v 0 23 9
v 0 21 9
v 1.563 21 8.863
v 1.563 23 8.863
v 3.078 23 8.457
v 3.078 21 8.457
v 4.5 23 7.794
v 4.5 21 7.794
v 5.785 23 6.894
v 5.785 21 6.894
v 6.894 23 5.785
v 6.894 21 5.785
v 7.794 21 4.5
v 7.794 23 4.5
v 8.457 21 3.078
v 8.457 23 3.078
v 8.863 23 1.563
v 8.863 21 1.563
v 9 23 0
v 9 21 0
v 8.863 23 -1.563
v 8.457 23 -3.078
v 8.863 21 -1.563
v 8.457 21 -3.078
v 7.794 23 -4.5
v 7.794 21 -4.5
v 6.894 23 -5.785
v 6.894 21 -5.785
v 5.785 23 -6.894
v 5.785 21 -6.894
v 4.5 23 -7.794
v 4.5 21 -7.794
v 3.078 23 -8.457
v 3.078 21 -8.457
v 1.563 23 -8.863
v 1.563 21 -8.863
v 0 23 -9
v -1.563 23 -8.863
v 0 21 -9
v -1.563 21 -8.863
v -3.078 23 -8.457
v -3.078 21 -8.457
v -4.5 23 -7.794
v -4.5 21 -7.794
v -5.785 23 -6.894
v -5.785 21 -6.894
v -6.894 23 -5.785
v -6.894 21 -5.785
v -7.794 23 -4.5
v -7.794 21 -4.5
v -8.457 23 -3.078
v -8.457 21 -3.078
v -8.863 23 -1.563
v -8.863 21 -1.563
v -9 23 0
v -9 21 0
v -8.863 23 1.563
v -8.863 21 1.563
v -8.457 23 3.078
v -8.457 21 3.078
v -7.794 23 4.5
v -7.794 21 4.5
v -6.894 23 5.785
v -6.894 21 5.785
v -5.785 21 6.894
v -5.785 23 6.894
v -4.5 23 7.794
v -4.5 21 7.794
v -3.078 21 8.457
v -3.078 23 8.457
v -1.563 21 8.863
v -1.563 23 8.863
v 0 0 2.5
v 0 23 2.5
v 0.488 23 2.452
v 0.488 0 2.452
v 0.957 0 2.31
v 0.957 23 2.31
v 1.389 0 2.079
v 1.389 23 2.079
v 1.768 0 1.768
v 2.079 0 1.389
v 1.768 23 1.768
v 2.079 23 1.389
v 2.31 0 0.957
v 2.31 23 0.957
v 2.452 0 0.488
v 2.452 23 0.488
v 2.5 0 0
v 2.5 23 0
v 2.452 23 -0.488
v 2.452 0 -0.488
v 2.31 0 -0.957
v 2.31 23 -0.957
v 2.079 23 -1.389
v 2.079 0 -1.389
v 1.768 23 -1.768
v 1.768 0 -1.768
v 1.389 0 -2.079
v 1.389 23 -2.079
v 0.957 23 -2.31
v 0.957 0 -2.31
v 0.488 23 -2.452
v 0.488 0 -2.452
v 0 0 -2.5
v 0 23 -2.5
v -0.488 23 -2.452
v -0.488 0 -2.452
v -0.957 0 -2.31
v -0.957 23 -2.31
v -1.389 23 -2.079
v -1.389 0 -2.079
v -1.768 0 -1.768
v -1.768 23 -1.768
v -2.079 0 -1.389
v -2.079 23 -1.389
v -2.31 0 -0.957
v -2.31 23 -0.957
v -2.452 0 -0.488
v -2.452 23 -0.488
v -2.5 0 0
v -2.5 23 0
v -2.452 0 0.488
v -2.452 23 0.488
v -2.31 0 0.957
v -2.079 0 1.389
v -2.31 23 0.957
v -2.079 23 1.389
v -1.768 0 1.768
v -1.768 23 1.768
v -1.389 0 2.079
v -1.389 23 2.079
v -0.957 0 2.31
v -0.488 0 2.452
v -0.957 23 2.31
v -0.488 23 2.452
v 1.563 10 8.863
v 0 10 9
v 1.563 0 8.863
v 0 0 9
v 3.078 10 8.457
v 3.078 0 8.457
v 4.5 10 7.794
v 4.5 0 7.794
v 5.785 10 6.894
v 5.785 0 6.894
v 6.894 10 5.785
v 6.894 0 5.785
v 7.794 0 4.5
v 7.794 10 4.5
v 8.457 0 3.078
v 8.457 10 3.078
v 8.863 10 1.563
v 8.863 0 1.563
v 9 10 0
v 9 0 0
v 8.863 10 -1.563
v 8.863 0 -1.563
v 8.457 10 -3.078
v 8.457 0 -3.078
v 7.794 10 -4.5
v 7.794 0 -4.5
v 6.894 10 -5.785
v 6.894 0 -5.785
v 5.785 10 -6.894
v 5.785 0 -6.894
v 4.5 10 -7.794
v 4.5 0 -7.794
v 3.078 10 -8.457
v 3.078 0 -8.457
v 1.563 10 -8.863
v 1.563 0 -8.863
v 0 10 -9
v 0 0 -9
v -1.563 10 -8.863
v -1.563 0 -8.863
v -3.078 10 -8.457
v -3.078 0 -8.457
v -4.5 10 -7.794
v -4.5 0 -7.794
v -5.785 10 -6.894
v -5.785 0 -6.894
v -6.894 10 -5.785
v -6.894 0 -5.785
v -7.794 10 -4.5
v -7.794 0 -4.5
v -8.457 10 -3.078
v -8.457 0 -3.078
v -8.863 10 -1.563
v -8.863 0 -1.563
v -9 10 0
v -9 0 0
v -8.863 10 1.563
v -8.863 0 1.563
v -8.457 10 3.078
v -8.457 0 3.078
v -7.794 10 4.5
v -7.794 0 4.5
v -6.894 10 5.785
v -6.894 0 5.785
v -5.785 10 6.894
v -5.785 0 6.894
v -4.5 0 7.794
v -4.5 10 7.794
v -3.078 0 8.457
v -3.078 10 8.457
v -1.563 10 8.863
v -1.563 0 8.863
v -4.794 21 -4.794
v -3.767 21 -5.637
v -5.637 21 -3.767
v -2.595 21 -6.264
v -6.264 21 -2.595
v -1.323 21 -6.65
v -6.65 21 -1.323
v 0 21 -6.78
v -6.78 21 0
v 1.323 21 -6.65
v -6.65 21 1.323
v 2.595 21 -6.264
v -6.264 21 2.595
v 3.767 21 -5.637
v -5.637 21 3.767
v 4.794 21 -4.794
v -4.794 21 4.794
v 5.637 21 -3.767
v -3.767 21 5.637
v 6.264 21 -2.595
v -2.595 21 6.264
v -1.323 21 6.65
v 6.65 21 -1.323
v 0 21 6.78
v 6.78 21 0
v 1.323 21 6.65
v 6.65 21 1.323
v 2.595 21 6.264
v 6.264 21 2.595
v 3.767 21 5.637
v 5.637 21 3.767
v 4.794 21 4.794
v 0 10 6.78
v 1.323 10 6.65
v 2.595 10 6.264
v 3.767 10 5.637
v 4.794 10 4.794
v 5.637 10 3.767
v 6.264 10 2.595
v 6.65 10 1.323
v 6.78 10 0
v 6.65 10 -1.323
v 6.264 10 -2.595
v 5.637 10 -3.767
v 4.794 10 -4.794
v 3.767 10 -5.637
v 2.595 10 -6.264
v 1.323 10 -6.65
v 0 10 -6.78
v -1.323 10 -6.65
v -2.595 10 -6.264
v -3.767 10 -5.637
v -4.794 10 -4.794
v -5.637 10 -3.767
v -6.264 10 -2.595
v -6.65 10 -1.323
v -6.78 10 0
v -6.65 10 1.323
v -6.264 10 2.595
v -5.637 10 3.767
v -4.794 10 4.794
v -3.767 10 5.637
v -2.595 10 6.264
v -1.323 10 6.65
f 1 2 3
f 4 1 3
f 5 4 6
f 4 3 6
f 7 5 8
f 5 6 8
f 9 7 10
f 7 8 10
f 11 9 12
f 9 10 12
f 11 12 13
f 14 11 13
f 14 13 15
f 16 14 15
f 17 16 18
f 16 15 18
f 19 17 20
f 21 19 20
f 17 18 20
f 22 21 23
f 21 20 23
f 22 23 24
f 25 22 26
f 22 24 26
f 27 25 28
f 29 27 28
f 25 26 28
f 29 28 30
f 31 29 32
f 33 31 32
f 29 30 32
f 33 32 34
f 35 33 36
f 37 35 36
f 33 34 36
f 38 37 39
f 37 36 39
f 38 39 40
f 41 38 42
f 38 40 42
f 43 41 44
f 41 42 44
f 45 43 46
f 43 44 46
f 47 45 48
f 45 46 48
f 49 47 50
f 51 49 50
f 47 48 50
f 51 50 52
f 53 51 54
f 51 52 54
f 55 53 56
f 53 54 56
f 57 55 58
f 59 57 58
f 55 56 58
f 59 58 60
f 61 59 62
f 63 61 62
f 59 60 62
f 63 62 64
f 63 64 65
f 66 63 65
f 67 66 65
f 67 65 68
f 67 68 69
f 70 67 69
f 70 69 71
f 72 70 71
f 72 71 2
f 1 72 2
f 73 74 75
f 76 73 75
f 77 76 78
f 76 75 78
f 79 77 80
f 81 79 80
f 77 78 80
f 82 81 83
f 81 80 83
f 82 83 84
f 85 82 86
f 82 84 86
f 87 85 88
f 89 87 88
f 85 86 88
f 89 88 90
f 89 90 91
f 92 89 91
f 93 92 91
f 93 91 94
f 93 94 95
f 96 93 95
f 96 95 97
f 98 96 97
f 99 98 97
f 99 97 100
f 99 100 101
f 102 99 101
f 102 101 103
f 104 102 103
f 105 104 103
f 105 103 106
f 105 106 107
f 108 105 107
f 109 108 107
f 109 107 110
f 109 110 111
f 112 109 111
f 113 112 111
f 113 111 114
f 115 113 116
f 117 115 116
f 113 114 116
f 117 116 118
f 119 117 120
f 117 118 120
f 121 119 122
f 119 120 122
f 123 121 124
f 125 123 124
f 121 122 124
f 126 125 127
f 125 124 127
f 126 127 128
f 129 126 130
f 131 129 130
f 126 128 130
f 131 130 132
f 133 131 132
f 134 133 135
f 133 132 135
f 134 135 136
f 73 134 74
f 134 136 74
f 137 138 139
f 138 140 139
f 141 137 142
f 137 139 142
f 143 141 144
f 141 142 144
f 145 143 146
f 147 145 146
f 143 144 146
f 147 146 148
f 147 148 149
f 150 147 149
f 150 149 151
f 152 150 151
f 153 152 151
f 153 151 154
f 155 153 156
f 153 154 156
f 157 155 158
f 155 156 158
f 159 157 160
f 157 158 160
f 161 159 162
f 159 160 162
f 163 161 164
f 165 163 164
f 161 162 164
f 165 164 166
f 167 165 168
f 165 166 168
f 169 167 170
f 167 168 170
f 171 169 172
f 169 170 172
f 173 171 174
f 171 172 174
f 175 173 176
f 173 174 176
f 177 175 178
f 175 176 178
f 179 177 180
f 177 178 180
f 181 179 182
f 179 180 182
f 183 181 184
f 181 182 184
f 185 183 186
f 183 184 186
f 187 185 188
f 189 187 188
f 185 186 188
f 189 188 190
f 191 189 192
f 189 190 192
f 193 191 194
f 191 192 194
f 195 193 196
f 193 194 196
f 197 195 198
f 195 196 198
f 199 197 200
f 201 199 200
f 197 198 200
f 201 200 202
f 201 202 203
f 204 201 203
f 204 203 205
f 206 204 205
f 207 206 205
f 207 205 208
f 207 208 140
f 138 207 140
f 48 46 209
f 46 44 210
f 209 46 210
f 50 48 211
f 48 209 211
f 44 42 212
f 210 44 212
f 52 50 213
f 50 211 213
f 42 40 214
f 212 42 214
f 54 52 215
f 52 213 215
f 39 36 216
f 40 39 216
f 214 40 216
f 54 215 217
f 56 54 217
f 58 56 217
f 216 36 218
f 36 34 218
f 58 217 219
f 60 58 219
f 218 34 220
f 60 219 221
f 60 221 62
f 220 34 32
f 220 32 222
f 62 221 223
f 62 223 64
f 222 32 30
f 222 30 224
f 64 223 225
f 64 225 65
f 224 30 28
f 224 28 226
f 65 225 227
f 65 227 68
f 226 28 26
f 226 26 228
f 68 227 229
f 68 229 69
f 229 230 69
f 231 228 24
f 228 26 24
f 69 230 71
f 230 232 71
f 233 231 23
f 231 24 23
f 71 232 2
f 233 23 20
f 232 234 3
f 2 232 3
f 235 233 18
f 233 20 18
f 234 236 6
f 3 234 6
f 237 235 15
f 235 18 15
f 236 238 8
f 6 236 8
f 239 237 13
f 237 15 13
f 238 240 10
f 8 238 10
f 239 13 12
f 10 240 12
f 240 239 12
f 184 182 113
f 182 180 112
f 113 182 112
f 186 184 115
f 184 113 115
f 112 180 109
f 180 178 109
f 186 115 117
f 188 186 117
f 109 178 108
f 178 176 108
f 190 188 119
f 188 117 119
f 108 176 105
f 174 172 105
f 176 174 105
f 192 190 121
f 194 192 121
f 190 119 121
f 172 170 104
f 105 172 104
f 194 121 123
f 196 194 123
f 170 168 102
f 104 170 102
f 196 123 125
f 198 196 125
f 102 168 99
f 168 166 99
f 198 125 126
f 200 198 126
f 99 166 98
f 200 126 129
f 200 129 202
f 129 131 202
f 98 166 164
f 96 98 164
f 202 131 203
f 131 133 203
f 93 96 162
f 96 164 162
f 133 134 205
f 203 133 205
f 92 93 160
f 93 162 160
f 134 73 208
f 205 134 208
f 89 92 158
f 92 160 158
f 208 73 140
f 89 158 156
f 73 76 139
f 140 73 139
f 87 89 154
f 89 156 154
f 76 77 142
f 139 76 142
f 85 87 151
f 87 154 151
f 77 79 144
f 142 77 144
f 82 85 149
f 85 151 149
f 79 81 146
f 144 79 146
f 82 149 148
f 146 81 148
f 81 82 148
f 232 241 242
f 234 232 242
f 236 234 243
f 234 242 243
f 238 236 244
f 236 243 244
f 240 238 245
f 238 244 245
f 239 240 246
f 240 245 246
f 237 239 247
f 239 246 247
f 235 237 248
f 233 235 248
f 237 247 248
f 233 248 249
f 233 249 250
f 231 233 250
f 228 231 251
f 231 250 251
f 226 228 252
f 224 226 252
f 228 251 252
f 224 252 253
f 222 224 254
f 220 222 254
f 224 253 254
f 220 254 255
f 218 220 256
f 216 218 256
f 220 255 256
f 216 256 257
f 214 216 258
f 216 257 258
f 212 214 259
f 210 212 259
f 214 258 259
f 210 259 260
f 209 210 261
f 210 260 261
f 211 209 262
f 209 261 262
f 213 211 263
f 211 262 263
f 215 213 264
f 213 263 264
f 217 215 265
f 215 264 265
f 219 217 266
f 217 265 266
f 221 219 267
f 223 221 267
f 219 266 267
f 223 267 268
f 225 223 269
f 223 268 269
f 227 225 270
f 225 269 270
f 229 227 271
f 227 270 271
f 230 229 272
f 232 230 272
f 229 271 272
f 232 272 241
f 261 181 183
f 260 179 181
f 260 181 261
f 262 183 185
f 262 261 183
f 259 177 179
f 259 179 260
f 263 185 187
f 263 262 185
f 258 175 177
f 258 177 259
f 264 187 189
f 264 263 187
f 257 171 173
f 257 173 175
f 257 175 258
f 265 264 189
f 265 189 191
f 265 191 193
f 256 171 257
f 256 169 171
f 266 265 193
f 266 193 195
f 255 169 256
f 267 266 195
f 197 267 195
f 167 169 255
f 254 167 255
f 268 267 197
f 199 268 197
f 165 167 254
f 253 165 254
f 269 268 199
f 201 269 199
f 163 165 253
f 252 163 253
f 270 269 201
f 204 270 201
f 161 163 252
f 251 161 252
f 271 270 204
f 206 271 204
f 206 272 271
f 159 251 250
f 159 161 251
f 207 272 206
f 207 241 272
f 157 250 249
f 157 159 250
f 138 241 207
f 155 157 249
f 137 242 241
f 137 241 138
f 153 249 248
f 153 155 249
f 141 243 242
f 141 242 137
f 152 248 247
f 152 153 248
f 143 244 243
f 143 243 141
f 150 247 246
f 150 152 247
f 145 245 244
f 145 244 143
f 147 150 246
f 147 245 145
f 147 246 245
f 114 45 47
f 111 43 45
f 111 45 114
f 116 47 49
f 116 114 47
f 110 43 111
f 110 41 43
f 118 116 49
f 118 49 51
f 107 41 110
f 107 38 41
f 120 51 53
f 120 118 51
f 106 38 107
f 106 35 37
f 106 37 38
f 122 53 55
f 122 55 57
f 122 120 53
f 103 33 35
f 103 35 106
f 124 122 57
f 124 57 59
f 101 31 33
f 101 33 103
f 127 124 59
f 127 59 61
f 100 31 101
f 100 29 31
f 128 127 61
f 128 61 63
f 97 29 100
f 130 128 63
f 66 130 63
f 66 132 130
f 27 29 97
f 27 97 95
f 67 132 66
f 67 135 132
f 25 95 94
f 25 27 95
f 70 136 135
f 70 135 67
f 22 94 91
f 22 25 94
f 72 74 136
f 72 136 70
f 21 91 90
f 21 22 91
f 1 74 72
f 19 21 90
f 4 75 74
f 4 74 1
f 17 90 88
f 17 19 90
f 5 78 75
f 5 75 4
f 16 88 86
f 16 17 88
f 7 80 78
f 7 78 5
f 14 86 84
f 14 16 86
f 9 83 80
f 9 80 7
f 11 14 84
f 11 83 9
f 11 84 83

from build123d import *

# Parameters (mm, degrees)
SKETCH_1_R          = 9
EXTRUDE_1_DEPTH     = 8
SKETCH_2_R          = 9
EXTRUDE_2_DEPTH     = 2
SKETCH_3_R          = 6.78
EXTRUDE_3_DEPTH     = 11
SKETCH_4_R          = 9
EXTRUDE_4_DEPTH     = 2
SKETCH_5_R          = 2.5
CUT_EXTRUDE_1_DEPTH = 31


with BuildPart() as part:
    # 草图1 → 凸台-拉伸1 (new body)
    with BuildSketch(Plane(origin=(0, 0, 0), x_dir=(1, 0, 0), z_dir=(0, 1, 0))):
        with Locations(Location((0, 0, 0), (0, 0, 270))):
            Circle(SKETCH_1_R)
    extrude(amount=EXTRUDE_1_DEPTH)

    # 草图2 → 凸台-拉伸2 (add)
    with BuildSketch(Plane(origin=(0, 8, 0), x_dir=(1, 0, 0), z_dir=(0, 1, 0))):
        with Locations(Location((0, 0, 0), (0, 0, 270))):
            Circle(SKETCH_2_R)
    extrude(amount=EXTRUDE_2_DEPTH)

    # 草图3 → 凸台-拉伸3 (add)
    with BuildSketch(Plane(origin=(0, 10, 0), x_dir=(1, 0, 0), z_dir=(0, 1, 0))):
        with Locations(Location((0, 0, 0), (0, 0, 270))):
            Circle(SKETCH_3_R)
    extrude(amount=EXTRUDE_3_DEPTH)

    # 草图4 → 凸台-拉伸4 (add)
    with BuildSketch(Plane(origin=(0, 21, 0), x_dir=(1, 0, 0), z_dir=(0, 1, 0))):
        with Locations(Location((0, 0, 0), (0, 0, 270))):
            Circle(SKETCH_4_R)
    extrude(amount=EXTRUDE_4_DEPTH)

    # 草图5 → 切除-拉伸1 (cut)
    with BuildSketch(Plane(origin=(0, 23, 0), x_dir=(1, 0, 0), z_dir=(0, 1, 0))):
        with Locations(Location((0, 0, 0), (0, 0, 270))):
            Circle(SKETCH_5_R)
    extrude(amount=-CUT_EXTRUDE_1_DEPTH, mode=Mode.SUBTRACT)


solid = part.part
